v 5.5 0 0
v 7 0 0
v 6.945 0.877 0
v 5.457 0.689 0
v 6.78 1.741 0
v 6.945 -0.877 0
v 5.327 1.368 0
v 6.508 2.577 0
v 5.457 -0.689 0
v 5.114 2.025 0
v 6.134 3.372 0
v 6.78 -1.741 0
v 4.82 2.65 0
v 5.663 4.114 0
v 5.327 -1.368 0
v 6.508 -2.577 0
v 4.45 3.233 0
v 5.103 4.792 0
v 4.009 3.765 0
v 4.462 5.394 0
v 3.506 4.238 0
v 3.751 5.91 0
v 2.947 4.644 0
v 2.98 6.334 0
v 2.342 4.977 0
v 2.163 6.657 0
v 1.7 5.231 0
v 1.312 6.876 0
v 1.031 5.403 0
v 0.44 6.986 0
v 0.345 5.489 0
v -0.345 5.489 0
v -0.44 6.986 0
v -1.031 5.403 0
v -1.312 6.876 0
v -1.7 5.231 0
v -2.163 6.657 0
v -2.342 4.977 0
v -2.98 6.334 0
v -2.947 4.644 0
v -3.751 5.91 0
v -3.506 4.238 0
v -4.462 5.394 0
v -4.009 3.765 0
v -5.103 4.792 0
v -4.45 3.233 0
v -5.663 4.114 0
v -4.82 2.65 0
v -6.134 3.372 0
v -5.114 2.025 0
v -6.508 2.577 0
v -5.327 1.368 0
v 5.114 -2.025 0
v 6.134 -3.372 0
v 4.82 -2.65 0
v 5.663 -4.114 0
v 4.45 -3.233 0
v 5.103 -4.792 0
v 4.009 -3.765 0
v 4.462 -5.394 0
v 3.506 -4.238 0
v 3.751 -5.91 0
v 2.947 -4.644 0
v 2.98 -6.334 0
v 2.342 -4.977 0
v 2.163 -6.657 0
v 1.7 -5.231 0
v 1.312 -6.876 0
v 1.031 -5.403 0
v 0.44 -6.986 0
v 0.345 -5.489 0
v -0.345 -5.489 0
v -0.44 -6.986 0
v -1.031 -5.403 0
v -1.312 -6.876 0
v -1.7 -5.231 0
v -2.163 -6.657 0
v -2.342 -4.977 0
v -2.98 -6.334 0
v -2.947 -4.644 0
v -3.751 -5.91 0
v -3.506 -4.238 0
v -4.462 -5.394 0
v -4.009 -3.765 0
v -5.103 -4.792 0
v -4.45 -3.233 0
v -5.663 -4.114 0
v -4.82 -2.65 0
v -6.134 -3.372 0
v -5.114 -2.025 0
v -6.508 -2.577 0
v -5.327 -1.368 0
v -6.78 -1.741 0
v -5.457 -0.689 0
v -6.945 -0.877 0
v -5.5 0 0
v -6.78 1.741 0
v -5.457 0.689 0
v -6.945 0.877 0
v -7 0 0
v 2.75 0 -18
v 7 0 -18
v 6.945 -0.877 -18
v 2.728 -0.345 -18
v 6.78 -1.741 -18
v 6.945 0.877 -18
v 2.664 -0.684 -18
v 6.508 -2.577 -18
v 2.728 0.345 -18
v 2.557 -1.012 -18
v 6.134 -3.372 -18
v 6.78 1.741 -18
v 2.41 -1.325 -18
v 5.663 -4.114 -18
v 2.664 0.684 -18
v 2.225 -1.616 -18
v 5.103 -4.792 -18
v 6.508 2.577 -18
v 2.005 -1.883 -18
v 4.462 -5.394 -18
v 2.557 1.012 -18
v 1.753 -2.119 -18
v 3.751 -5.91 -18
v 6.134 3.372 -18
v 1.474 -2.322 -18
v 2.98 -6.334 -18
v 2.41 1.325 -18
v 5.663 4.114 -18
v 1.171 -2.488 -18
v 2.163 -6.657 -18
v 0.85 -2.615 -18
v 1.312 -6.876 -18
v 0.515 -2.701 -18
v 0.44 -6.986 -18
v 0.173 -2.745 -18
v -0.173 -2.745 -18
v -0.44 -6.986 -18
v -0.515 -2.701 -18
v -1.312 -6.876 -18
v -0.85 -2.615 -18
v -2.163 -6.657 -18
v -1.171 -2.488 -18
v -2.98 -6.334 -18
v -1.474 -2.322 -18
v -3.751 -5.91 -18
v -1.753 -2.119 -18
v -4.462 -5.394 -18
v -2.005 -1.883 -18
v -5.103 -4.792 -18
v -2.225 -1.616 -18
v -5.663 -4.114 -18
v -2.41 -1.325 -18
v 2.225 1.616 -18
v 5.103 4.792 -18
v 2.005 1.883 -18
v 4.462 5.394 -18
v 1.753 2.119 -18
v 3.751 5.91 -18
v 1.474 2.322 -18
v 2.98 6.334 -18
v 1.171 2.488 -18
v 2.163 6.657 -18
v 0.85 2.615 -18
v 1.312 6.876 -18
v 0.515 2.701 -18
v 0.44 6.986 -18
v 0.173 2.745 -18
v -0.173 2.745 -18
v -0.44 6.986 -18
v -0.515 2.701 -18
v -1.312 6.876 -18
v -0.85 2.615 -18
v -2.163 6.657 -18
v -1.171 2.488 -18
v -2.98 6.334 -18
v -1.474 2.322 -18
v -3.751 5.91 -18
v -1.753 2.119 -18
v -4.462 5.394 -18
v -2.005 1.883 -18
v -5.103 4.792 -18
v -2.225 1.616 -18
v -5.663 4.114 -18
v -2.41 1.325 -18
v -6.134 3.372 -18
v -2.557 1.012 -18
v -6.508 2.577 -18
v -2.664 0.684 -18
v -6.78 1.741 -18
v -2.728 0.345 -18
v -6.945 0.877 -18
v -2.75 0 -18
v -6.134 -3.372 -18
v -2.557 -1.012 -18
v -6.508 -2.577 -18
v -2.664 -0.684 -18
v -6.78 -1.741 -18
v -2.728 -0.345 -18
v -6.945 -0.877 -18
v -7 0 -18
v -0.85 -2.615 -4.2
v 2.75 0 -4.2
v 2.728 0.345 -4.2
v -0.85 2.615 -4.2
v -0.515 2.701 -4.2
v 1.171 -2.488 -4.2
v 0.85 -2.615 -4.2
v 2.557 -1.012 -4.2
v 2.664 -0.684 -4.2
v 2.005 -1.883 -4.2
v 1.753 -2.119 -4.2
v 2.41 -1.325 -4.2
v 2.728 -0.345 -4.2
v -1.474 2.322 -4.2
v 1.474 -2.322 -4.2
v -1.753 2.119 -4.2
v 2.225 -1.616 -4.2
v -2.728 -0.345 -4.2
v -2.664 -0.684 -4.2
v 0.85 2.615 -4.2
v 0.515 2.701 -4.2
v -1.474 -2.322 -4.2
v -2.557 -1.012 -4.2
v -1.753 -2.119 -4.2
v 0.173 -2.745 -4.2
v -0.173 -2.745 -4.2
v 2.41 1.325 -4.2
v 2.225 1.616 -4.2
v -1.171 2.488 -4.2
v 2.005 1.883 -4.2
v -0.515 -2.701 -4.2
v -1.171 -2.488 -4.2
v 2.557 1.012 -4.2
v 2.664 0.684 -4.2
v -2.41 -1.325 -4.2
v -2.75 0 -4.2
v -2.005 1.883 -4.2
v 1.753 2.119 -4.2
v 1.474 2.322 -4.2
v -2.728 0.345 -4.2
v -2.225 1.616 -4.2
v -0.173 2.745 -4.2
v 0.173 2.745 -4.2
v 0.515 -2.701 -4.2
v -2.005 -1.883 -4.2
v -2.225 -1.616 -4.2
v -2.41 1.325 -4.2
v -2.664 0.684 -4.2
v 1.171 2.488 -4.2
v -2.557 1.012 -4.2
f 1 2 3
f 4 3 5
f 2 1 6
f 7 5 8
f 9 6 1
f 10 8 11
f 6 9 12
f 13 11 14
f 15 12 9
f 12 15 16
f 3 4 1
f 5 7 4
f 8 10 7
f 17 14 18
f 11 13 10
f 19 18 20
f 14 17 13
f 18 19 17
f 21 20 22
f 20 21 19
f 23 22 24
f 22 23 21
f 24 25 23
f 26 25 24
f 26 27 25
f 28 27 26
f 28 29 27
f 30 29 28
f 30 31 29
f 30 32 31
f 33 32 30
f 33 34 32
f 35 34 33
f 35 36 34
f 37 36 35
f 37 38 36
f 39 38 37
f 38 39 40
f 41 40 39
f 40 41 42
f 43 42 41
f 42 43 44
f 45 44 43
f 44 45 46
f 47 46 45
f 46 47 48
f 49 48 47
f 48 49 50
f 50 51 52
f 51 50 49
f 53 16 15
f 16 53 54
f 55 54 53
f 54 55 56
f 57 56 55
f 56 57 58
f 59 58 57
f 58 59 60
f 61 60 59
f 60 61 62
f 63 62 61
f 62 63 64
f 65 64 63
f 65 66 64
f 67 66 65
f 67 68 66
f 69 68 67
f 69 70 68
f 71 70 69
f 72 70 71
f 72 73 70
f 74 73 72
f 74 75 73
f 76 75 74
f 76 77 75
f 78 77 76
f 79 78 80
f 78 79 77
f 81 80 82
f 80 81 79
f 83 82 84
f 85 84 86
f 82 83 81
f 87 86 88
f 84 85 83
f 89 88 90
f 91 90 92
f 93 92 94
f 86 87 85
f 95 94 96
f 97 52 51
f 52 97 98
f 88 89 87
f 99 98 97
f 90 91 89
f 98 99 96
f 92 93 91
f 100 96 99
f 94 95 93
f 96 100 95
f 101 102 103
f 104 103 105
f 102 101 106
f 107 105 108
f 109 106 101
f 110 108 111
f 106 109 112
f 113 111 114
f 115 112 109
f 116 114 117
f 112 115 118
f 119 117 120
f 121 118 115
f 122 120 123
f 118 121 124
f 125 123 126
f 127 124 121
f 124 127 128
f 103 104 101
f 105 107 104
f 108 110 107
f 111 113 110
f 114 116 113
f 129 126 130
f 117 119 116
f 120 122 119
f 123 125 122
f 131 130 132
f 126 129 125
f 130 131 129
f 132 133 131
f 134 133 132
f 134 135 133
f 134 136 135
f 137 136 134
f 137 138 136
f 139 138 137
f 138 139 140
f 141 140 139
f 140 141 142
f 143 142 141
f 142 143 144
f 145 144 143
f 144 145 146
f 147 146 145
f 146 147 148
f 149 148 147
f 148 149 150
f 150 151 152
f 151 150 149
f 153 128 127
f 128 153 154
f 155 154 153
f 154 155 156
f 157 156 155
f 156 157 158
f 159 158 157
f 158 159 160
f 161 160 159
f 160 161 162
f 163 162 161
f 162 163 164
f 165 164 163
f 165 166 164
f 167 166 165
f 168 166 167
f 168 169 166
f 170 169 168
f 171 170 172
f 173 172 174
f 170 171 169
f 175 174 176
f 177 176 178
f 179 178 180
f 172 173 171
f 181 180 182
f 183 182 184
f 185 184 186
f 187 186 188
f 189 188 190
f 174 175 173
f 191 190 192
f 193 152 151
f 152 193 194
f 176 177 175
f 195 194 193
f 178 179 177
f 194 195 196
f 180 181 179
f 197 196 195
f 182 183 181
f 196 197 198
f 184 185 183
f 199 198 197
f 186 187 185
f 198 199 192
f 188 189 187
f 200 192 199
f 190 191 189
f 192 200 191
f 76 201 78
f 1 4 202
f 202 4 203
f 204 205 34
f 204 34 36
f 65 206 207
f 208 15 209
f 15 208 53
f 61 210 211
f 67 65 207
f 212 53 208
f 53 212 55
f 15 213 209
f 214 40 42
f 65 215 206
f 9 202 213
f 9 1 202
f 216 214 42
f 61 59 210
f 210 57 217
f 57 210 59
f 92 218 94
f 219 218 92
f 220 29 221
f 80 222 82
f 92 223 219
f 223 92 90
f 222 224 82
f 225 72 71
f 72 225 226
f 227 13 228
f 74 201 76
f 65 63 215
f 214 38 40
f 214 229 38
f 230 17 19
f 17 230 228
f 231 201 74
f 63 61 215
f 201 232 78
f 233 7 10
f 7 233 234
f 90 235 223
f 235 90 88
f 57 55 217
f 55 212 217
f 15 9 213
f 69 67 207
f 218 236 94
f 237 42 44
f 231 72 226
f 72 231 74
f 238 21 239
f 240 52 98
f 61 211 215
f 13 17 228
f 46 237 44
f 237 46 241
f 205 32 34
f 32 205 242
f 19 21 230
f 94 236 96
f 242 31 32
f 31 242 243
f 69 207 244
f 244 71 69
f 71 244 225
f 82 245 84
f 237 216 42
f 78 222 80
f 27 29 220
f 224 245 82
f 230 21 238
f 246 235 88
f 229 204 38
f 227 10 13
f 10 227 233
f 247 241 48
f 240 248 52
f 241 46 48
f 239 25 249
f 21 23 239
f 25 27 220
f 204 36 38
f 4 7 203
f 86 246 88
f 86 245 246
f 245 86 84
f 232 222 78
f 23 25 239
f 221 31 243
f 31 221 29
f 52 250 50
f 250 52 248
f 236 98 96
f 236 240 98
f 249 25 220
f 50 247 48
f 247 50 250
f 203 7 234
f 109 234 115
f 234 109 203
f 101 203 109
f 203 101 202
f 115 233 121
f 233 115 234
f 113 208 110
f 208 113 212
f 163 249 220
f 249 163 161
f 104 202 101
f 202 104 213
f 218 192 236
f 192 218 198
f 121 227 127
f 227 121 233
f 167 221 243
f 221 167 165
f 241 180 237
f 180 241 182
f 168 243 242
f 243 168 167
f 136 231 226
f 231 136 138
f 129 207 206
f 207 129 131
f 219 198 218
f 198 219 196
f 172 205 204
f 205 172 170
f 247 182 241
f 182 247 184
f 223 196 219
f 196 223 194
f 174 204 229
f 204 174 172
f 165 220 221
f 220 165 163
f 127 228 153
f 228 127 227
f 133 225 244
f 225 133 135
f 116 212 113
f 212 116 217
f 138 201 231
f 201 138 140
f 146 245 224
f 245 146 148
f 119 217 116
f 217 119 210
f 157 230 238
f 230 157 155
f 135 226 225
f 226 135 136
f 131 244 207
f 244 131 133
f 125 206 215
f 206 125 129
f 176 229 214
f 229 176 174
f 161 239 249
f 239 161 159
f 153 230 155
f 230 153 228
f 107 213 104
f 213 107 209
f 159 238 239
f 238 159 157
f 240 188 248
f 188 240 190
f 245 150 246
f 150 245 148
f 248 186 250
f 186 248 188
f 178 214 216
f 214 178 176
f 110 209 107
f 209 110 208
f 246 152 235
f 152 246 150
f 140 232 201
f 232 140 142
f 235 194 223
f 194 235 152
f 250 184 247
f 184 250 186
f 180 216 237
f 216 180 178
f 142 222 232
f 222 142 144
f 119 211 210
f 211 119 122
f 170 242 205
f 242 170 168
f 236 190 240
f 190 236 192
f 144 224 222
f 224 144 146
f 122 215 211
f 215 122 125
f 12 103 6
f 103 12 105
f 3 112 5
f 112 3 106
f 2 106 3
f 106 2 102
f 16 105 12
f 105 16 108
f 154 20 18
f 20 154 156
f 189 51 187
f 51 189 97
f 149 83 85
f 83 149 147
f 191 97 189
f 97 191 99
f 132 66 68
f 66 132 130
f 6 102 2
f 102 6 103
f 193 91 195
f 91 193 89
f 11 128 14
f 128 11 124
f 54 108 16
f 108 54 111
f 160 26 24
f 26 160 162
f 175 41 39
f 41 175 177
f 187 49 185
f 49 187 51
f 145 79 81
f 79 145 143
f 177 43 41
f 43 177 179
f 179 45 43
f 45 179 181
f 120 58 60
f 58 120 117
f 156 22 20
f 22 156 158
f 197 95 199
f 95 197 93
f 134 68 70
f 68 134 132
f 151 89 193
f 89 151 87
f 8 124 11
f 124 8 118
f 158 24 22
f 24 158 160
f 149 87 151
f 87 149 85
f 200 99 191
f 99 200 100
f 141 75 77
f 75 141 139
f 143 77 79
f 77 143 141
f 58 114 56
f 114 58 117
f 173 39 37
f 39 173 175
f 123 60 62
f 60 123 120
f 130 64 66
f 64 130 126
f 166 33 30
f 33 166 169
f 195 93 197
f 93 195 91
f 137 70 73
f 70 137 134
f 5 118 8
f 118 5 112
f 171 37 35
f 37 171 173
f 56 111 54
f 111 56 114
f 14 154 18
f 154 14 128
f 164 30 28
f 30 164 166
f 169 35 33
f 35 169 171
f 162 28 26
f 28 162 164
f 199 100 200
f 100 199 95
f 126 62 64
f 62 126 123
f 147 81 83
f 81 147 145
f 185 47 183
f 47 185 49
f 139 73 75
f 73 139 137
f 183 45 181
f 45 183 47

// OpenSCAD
$fn = 50;


difference() {
	union() {
		translate(v = [0, 0, -18.0000000000]) {
			cylinder(h = 18, r = 7.0000000000);
		}
		cylinder(h = 0, r = 17.0000000000);
	}
	union() {
		translate(v = [0, 0, 0]) {
			rotate(a = [0, 0, 0]) {
				difference() {
					union() {
						#translate(v = [0, 0, -18.0000000000]) {
							cylinder(h = 18, r = 2.2500000000);
						}
						#translate(v = [0, 0, -4.2000000000]) {
							cylinder(h = 4.2000000000, r = 7.0000000000, r1 = 2.7500000000, r2 = 5.5000000000);
						}
						#translate(v = [0, 0, -18.0000000000]) {
							cylinder(h = 18, r = 2.7500000000);
						}
						#translate(v = [0, 0, -18.0000000000]) {
							cylinder(h = 18, r = 2.2500000000);
						}
					}
					union();
				}
			}
		}
	}
}
